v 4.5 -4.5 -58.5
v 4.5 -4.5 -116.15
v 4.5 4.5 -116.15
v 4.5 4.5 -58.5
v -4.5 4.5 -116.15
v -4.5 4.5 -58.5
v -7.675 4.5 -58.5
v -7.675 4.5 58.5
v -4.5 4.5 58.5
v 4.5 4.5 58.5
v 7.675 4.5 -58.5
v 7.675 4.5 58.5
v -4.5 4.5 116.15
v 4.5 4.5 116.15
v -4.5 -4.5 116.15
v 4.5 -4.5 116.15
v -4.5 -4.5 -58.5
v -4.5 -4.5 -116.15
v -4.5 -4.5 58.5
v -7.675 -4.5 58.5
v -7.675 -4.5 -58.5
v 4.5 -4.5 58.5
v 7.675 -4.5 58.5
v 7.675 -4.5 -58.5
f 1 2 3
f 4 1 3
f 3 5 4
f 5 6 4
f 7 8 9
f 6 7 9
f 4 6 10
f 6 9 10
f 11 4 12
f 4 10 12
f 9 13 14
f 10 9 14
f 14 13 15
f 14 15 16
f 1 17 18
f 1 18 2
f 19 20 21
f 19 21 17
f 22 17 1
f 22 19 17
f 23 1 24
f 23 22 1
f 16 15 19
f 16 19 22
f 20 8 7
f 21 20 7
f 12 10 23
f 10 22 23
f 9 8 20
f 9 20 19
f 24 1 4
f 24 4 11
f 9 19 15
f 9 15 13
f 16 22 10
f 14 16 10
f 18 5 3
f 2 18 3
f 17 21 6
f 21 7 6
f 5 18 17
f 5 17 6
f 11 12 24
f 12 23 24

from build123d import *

# Parameters (mm, degrees)
SKETCH1_W           = 9
SKETCH1_H           = 9
BOSS_EXTRUDE1_DEPTH = 116.15
SKETCH2_W           = 3.175
SKETCH2_H           = 117
BOSS_EXTRUDE2_DEPTH = 4.5


with BuildPart() as part:
    # Sketch1 → Boss-Extrude1 (new body, symmetric)
    with BuildSketch(Plane.XY):
        Rectangle(SKETCH1_W, SKETCH1_H)
    extrude(amount=BOSS_EXTRUDE1_DEPTH, both=True)

    # Sketch2 → Boss-Extrude2 (add, symmetric)
    with BuildSketch(Plane(origin=(0, 0, 0), x_dir=(1, 0, 0), z_dir=(0, 1, 0))):
        with Locations((6.0875, 0)):
            Rectangle(SKETCH2_W, SKETCH2_H)
        with Locations((-6.0875, 0)):
            Rectangle(SKETCH2_W, SKETCH2_H)
    extrude(amount=BOSS_EXTRUDE2_DEPTH, both=True)


solid = part.part
